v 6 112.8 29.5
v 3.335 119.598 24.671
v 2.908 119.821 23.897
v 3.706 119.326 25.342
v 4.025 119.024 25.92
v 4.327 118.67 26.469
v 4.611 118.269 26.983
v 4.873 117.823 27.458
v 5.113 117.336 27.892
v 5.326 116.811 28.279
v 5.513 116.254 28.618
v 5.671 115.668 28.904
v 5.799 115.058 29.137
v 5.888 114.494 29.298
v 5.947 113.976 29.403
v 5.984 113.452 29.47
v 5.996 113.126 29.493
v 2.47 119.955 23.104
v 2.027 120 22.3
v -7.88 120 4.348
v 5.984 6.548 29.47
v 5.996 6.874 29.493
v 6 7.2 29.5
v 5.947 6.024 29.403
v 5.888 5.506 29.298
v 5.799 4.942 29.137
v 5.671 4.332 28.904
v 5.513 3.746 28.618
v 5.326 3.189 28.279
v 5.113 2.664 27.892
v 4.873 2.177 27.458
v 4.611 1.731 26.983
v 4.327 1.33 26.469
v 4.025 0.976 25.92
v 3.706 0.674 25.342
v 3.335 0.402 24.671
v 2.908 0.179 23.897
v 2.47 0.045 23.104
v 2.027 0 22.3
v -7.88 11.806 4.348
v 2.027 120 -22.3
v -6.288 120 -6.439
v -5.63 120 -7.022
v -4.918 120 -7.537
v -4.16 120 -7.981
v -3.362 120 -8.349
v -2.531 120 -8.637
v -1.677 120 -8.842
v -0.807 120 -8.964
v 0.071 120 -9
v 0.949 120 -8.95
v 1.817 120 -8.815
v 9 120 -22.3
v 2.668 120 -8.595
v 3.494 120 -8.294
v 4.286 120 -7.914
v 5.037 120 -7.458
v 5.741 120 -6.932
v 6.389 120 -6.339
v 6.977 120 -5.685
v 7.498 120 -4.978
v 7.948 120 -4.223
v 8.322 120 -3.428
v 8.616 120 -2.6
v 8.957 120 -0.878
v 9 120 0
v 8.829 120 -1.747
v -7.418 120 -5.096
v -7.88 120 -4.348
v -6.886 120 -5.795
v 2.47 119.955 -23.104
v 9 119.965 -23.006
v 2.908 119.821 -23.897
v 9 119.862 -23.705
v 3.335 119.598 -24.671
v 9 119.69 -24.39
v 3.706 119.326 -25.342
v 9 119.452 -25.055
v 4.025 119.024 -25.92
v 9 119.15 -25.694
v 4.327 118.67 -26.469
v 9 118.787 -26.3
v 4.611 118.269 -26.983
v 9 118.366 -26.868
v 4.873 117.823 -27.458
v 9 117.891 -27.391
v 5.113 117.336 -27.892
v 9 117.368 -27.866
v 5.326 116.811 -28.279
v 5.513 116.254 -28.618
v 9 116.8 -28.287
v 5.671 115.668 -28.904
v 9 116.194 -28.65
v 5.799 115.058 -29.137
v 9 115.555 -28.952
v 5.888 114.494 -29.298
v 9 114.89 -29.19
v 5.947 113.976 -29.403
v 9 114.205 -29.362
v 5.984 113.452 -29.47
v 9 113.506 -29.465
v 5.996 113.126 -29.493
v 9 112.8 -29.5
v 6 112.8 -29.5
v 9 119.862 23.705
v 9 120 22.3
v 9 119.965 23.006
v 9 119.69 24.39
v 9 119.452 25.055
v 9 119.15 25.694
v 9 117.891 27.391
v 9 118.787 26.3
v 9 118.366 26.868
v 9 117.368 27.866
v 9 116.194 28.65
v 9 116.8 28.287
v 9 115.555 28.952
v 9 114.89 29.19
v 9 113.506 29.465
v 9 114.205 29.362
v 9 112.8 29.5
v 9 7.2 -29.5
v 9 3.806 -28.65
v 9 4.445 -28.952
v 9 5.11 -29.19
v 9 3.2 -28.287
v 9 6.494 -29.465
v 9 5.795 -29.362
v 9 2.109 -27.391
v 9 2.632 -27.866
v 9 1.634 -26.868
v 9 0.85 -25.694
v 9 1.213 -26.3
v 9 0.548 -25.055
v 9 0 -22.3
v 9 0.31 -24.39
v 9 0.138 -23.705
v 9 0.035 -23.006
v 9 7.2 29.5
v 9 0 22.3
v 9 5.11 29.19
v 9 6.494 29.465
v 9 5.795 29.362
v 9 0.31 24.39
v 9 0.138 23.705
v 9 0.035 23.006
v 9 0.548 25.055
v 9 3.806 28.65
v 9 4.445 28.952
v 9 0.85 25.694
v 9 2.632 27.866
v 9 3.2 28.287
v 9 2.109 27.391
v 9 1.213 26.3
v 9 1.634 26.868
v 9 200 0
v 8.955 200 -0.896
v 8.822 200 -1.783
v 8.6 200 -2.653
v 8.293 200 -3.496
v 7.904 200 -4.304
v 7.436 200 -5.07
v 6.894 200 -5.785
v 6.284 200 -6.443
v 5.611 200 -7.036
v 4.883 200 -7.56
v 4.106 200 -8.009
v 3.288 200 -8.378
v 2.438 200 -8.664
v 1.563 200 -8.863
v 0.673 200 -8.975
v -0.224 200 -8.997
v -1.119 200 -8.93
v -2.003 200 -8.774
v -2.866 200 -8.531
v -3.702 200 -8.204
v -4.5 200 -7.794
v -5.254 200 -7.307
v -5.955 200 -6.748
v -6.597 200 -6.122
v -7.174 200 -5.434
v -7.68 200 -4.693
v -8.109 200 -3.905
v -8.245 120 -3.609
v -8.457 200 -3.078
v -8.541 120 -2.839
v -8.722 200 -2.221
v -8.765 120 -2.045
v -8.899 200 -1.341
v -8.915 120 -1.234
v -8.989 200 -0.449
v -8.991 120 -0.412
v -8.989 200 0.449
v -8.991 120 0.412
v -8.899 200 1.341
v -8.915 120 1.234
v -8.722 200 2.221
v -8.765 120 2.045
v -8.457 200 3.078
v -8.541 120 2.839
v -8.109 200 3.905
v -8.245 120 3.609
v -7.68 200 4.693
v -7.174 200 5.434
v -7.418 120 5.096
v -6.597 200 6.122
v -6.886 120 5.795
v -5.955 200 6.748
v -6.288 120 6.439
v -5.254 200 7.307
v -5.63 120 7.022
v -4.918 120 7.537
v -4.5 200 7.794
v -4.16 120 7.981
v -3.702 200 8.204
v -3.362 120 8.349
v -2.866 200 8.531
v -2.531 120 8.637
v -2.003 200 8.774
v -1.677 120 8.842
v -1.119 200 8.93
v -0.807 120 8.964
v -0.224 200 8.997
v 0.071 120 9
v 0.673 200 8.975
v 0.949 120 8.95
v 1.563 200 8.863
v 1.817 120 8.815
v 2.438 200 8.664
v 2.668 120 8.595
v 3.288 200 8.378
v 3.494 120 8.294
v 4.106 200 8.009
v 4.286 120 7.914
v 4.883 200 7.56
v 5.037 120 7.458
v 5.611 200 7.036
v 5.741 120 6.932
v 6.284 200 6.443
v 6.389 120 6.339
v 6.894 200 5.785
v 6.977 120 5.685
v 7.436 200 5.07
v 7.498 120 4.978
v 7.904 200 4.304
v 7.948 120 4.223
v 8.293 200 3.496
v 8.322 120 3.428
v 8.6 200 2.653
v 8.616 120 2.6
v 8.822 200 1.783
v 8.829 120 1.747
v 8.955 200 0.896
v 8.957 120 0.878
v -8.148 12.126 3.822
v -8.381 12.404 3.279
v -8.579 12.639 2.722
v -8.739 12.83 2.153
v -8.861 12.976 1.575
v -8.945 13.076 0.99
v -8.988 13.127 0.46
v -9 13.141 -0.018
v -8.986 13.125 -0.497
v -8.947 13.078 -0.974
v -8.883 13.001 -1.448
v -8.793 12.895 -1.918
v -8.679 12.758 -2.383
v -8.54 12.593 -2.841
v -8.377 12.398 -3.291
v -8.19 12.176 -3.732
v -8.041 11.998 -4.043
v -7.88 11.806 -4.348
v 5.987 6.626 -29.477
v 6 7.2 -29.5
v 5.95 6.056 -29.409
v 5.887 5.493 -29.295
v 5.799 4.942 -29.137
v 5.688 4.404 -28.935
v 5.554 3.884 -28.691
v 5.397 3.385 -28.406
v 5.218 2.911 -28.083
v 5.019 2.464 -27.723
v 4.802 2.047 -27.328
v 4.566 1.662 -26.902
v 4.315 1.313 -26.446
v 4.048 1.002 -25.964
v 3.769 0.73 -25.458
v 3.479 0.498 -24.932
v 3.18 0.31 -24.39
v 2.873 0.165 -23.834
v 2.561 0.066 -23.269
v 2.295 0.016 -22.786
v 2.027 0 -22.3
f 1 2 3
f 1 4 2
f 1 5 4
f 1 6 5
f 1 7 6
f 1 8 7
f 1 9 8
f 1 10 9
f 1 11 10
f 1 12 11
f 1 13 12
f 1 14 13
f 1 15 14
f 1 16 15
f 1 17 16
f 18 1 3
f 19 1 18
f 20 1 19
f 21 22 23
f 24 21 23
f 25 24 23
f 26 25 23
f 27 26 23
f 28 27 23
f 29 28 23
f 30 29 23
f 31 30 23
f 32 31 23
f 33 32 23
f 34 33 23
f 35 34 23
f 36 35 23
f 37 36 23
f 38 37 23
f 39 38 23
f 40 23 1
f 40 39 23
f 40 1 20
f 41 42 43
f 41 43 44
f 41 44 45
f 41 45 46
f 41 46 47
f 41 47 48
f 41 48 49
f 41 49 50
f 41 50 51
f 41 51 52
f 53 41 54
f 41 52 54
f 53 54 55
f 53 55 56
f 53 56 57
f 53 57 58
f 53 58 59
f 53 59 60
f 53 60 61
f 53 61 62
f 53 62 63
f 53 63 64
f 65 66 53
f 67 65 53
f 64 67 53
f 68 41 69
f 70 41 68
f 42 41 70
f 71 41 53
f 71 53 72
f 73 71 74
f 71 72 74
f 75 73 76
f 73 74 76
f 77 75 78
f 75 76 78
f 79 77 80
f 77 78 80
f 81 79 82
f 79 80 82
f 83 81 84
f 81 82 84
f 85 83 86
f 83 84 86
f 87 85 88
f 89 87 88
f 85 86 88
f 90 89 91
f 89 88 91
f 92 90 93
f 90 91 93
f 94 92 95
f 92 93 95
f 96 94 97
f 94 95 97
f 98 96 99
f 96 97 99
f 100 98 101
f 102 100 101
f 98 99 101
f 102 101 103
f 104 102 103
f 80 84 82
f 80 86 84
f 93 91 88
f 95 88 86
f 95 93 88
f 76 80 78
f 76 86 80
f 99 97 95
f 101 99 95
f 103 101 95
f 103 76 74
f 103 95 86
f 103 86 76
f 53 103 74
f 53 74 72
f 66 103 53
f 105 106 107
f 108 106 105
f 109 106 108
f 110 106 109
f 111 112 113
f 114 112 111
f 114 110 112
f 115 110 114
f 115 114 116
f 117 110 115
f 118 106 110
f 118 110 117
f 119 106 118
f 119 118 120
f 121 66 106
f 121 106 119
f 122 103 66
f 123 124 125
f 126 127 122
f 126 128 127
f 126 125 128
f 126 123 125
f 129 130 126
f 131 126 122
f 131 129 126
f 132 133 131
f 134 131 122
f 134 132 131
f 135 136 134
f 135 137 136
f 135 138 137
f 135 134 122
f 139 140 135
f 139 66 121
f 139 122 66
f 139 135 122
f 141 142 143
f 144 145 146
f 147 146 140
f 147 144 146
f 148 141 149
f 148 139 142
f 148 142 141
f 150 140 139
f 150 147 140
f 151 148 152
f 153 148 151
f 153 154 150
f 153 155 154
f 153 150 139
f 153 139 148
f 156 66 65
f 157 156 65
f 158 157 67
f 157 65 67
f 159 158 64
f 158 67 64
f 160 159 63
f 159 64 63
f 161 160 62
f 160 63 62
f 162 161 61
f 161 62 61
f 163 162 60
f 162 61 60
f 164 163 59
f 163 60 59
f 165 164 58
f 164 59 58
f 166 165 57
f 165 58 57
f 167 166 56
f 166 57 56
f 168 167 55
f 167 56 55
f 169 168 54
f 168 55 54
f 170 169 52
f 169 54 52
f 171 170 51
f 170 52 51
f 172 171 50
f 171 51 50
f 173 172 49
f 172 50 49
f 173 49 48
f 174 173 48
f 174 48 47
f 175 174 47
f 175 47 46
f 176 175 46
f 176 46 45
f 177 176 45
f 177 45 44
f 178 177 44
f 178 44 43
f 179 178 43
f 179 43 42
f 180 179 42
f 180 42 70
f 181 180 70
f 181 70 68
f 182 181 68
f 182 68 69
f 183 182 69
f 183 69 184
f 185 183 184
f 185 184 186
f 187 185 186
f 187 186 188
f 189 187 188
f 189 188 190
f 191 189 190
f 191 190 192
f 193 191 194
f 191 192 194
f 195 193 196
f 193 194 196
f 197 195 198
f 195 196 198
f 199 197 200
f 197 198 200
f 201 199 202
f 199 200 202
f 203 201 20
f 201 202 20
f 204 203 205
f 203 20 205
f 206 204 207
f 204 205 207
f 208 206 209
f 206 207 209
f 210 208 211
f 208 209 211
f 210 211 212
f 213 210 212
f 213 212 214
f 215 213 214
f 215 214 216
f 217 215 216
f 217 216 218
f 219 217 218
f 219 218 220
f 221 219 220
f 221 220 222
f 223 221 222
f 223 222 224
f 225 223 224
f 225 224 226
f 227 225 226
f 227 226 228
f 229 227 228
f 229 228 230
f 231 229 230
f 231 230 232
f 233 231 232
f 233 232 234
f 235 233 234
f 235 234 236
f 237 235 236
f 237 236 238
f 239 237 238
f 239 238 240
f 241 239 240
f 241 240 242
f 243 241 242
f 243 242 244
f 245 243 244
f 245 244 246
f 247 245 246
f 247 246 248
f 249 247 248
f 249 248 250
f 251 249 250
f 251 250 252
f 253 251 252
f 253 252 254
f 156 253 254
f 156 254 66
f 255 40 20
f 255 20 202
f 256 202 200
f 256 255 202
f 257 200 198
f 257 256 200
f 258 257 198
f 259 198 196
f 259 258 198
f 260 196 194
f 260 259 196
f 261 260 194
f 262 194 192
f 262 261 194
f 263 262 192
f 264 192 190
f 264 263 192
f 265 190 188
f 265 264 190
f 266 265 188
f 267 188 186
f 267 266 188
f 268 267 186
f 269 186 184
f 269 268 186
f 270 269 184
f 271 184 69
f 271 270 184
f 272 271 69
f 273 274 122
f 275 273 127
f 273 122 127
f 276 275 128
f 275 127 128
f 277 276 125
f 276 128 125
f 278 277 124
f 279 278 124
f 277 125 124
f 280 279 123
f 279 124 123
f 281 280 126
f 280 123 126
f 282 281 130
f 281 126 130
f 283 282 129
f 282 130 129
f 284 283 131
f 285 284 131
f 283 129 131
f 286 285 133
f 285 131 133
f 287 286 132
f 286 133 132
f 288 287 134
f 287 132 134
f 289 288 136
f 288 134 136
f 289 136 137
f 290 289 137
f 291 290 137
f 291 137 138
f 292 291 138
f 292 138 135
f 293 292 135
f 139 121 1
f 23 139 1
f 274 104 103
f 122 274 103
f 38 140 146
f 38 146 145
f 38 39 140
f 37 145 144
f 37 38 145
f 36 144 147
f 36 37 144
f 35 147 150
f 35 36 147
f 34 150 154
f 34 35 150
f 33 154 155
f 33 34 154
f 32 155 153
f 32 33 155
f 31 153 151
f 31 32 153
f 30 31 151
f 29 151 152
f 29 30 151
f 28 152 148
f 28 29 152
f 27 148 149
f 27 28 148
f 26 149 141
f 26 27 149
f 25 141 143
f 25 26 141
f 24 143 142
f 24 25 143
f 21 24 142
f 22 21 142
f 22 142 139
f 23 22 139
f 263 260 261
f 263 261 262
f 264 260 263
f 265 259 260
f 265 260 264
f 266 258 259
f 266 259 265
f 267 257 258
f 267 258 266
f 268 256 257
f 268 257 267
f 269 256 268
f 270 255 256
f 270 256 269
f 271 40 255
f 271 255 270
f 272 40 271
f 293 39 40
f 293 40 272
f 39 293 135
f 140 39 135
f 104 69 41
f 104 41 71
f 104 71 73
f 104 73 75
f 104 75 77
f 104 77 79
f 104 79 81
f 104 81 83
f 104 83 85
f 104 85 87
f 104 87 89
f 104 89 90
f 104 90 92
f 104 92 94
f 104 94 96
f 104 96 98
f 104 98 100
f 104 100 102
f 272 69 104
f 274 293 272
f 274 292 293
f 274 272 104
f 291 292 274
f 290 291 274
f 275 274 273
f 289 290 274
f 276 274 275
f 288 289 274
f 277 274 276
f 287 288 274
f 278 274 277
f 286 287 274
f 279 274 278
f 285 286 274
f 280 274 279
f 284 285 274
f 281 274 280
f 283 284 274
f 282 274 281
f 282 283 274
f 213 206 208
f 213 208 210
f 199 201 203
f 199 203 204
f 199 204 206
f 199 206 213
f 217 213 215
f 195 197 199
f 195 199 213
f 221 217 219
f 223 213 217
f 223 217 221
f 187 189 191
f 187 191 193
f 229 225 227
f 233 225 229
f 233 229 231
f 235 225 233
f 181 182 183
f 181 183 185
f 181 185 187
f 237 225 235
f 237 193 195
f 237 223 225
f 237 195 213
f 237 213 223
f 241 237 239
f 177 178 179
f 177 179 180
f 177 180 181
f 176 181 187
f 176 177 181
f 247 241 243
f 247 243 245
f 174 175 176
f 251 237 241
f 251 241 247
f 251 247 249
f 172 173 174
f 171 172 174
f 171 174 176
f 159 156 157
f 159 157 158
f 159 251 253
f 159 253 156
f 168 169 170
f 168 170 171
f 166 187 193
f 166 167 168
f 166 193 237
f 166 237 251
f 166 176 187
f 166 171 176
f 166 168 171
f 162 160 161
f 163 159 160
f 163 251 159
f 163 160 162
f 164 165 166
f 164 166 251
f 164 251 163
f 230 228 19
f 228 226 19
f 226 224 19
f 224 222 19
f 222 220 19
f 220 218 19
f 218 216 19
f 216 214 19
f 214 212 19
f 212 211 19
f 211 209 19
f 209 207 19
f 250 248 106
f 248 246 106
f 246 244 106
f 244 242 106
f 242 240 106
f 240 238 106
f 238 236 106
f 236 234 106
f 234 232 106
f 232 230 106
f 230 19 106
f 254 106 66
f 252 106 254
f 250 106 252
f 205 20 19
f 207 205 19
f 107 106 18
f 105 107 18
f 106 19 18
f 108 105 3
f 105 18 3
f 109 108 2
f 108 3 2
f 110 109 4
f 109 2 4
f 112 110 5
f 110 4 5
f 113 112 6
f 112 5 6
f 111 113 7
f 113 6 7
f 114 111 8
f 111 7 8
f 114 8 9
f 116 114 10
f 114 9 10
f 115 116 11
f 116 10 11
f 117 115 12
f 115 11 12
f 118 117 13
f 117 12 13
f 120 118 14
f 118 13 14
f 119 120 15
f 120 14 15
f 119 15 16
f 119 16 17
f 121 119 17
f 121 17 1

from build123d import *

# Parameters (mm, degrees)
CROQUIS1_R              = 9
SALIENTE_EXTRUIR1_DEPTH = 200
SALIENTE_EXTRUIR2_DEPTH = 120
REDONDEO1_R             = 7.2
CORTAR_EXTRUIR1_DEPTH   = 120


with BuildPart() as part:
    # Croquis1 → Saliente-Extruir1 (new body)
    with BuildSketch(Plane(origin=(0, 0, 0), x_dir=(1, 0, 0), z_dir=(0, 1, 0))):
        Circle(CROQUIS1_R)
    extrude(amount=SALIENTE_EXTRUIR1_DEPTH)

    # Croquis2 → Saliente-Extruir2 (add)
    with BuildSketch(Plane.XZ):
        with BuildLine():
            Line((6, 29.5), (-7.879793, 4.348432))
            ThreePointArc((-7.879793, 4.348432), (-9, 0), (-7.879793, -4.348432))
            Line((-7.879793, -4.348432), (6, -29.5))
            Line((6, -29.5), (9, -29.5))
            Line((9, -29.5), (9, 29.5))
            Line((9, 29.5), (6, 29.5))
        make_face()
    extrude(amount=-SALIENTE_EXTRUIR2_DEPTH)

    # Redondeo1
    redondeo1_edges = [part.edges().sort_by_distance(p)[0] for p in [
        (7.5, 0, 29.5),
        (7.5, 120, 29.5),
        (7.5, 120, -29.5),
        (7.5, 0, -29.5),
    ]]
    fillet(redondeo1_edges, radius=REDONDEO1_R)

    # Croquis3 → Cortar-Extruir1 (cut)
    with BuildSketch(Plane(origin=(0, 0, -29.5), x_dir=(-1, 0, 0), z_dir=(0, 0, -1))):
        Polygon((-2.026709, 0), (10.656807, 15.115625), (12.907476, -4.543474), align=None)
    extrude(amount=-CORTAR_EXTRUIR1_DEPTH, mode=Mode.SUBTRACT)


solid = part.part
